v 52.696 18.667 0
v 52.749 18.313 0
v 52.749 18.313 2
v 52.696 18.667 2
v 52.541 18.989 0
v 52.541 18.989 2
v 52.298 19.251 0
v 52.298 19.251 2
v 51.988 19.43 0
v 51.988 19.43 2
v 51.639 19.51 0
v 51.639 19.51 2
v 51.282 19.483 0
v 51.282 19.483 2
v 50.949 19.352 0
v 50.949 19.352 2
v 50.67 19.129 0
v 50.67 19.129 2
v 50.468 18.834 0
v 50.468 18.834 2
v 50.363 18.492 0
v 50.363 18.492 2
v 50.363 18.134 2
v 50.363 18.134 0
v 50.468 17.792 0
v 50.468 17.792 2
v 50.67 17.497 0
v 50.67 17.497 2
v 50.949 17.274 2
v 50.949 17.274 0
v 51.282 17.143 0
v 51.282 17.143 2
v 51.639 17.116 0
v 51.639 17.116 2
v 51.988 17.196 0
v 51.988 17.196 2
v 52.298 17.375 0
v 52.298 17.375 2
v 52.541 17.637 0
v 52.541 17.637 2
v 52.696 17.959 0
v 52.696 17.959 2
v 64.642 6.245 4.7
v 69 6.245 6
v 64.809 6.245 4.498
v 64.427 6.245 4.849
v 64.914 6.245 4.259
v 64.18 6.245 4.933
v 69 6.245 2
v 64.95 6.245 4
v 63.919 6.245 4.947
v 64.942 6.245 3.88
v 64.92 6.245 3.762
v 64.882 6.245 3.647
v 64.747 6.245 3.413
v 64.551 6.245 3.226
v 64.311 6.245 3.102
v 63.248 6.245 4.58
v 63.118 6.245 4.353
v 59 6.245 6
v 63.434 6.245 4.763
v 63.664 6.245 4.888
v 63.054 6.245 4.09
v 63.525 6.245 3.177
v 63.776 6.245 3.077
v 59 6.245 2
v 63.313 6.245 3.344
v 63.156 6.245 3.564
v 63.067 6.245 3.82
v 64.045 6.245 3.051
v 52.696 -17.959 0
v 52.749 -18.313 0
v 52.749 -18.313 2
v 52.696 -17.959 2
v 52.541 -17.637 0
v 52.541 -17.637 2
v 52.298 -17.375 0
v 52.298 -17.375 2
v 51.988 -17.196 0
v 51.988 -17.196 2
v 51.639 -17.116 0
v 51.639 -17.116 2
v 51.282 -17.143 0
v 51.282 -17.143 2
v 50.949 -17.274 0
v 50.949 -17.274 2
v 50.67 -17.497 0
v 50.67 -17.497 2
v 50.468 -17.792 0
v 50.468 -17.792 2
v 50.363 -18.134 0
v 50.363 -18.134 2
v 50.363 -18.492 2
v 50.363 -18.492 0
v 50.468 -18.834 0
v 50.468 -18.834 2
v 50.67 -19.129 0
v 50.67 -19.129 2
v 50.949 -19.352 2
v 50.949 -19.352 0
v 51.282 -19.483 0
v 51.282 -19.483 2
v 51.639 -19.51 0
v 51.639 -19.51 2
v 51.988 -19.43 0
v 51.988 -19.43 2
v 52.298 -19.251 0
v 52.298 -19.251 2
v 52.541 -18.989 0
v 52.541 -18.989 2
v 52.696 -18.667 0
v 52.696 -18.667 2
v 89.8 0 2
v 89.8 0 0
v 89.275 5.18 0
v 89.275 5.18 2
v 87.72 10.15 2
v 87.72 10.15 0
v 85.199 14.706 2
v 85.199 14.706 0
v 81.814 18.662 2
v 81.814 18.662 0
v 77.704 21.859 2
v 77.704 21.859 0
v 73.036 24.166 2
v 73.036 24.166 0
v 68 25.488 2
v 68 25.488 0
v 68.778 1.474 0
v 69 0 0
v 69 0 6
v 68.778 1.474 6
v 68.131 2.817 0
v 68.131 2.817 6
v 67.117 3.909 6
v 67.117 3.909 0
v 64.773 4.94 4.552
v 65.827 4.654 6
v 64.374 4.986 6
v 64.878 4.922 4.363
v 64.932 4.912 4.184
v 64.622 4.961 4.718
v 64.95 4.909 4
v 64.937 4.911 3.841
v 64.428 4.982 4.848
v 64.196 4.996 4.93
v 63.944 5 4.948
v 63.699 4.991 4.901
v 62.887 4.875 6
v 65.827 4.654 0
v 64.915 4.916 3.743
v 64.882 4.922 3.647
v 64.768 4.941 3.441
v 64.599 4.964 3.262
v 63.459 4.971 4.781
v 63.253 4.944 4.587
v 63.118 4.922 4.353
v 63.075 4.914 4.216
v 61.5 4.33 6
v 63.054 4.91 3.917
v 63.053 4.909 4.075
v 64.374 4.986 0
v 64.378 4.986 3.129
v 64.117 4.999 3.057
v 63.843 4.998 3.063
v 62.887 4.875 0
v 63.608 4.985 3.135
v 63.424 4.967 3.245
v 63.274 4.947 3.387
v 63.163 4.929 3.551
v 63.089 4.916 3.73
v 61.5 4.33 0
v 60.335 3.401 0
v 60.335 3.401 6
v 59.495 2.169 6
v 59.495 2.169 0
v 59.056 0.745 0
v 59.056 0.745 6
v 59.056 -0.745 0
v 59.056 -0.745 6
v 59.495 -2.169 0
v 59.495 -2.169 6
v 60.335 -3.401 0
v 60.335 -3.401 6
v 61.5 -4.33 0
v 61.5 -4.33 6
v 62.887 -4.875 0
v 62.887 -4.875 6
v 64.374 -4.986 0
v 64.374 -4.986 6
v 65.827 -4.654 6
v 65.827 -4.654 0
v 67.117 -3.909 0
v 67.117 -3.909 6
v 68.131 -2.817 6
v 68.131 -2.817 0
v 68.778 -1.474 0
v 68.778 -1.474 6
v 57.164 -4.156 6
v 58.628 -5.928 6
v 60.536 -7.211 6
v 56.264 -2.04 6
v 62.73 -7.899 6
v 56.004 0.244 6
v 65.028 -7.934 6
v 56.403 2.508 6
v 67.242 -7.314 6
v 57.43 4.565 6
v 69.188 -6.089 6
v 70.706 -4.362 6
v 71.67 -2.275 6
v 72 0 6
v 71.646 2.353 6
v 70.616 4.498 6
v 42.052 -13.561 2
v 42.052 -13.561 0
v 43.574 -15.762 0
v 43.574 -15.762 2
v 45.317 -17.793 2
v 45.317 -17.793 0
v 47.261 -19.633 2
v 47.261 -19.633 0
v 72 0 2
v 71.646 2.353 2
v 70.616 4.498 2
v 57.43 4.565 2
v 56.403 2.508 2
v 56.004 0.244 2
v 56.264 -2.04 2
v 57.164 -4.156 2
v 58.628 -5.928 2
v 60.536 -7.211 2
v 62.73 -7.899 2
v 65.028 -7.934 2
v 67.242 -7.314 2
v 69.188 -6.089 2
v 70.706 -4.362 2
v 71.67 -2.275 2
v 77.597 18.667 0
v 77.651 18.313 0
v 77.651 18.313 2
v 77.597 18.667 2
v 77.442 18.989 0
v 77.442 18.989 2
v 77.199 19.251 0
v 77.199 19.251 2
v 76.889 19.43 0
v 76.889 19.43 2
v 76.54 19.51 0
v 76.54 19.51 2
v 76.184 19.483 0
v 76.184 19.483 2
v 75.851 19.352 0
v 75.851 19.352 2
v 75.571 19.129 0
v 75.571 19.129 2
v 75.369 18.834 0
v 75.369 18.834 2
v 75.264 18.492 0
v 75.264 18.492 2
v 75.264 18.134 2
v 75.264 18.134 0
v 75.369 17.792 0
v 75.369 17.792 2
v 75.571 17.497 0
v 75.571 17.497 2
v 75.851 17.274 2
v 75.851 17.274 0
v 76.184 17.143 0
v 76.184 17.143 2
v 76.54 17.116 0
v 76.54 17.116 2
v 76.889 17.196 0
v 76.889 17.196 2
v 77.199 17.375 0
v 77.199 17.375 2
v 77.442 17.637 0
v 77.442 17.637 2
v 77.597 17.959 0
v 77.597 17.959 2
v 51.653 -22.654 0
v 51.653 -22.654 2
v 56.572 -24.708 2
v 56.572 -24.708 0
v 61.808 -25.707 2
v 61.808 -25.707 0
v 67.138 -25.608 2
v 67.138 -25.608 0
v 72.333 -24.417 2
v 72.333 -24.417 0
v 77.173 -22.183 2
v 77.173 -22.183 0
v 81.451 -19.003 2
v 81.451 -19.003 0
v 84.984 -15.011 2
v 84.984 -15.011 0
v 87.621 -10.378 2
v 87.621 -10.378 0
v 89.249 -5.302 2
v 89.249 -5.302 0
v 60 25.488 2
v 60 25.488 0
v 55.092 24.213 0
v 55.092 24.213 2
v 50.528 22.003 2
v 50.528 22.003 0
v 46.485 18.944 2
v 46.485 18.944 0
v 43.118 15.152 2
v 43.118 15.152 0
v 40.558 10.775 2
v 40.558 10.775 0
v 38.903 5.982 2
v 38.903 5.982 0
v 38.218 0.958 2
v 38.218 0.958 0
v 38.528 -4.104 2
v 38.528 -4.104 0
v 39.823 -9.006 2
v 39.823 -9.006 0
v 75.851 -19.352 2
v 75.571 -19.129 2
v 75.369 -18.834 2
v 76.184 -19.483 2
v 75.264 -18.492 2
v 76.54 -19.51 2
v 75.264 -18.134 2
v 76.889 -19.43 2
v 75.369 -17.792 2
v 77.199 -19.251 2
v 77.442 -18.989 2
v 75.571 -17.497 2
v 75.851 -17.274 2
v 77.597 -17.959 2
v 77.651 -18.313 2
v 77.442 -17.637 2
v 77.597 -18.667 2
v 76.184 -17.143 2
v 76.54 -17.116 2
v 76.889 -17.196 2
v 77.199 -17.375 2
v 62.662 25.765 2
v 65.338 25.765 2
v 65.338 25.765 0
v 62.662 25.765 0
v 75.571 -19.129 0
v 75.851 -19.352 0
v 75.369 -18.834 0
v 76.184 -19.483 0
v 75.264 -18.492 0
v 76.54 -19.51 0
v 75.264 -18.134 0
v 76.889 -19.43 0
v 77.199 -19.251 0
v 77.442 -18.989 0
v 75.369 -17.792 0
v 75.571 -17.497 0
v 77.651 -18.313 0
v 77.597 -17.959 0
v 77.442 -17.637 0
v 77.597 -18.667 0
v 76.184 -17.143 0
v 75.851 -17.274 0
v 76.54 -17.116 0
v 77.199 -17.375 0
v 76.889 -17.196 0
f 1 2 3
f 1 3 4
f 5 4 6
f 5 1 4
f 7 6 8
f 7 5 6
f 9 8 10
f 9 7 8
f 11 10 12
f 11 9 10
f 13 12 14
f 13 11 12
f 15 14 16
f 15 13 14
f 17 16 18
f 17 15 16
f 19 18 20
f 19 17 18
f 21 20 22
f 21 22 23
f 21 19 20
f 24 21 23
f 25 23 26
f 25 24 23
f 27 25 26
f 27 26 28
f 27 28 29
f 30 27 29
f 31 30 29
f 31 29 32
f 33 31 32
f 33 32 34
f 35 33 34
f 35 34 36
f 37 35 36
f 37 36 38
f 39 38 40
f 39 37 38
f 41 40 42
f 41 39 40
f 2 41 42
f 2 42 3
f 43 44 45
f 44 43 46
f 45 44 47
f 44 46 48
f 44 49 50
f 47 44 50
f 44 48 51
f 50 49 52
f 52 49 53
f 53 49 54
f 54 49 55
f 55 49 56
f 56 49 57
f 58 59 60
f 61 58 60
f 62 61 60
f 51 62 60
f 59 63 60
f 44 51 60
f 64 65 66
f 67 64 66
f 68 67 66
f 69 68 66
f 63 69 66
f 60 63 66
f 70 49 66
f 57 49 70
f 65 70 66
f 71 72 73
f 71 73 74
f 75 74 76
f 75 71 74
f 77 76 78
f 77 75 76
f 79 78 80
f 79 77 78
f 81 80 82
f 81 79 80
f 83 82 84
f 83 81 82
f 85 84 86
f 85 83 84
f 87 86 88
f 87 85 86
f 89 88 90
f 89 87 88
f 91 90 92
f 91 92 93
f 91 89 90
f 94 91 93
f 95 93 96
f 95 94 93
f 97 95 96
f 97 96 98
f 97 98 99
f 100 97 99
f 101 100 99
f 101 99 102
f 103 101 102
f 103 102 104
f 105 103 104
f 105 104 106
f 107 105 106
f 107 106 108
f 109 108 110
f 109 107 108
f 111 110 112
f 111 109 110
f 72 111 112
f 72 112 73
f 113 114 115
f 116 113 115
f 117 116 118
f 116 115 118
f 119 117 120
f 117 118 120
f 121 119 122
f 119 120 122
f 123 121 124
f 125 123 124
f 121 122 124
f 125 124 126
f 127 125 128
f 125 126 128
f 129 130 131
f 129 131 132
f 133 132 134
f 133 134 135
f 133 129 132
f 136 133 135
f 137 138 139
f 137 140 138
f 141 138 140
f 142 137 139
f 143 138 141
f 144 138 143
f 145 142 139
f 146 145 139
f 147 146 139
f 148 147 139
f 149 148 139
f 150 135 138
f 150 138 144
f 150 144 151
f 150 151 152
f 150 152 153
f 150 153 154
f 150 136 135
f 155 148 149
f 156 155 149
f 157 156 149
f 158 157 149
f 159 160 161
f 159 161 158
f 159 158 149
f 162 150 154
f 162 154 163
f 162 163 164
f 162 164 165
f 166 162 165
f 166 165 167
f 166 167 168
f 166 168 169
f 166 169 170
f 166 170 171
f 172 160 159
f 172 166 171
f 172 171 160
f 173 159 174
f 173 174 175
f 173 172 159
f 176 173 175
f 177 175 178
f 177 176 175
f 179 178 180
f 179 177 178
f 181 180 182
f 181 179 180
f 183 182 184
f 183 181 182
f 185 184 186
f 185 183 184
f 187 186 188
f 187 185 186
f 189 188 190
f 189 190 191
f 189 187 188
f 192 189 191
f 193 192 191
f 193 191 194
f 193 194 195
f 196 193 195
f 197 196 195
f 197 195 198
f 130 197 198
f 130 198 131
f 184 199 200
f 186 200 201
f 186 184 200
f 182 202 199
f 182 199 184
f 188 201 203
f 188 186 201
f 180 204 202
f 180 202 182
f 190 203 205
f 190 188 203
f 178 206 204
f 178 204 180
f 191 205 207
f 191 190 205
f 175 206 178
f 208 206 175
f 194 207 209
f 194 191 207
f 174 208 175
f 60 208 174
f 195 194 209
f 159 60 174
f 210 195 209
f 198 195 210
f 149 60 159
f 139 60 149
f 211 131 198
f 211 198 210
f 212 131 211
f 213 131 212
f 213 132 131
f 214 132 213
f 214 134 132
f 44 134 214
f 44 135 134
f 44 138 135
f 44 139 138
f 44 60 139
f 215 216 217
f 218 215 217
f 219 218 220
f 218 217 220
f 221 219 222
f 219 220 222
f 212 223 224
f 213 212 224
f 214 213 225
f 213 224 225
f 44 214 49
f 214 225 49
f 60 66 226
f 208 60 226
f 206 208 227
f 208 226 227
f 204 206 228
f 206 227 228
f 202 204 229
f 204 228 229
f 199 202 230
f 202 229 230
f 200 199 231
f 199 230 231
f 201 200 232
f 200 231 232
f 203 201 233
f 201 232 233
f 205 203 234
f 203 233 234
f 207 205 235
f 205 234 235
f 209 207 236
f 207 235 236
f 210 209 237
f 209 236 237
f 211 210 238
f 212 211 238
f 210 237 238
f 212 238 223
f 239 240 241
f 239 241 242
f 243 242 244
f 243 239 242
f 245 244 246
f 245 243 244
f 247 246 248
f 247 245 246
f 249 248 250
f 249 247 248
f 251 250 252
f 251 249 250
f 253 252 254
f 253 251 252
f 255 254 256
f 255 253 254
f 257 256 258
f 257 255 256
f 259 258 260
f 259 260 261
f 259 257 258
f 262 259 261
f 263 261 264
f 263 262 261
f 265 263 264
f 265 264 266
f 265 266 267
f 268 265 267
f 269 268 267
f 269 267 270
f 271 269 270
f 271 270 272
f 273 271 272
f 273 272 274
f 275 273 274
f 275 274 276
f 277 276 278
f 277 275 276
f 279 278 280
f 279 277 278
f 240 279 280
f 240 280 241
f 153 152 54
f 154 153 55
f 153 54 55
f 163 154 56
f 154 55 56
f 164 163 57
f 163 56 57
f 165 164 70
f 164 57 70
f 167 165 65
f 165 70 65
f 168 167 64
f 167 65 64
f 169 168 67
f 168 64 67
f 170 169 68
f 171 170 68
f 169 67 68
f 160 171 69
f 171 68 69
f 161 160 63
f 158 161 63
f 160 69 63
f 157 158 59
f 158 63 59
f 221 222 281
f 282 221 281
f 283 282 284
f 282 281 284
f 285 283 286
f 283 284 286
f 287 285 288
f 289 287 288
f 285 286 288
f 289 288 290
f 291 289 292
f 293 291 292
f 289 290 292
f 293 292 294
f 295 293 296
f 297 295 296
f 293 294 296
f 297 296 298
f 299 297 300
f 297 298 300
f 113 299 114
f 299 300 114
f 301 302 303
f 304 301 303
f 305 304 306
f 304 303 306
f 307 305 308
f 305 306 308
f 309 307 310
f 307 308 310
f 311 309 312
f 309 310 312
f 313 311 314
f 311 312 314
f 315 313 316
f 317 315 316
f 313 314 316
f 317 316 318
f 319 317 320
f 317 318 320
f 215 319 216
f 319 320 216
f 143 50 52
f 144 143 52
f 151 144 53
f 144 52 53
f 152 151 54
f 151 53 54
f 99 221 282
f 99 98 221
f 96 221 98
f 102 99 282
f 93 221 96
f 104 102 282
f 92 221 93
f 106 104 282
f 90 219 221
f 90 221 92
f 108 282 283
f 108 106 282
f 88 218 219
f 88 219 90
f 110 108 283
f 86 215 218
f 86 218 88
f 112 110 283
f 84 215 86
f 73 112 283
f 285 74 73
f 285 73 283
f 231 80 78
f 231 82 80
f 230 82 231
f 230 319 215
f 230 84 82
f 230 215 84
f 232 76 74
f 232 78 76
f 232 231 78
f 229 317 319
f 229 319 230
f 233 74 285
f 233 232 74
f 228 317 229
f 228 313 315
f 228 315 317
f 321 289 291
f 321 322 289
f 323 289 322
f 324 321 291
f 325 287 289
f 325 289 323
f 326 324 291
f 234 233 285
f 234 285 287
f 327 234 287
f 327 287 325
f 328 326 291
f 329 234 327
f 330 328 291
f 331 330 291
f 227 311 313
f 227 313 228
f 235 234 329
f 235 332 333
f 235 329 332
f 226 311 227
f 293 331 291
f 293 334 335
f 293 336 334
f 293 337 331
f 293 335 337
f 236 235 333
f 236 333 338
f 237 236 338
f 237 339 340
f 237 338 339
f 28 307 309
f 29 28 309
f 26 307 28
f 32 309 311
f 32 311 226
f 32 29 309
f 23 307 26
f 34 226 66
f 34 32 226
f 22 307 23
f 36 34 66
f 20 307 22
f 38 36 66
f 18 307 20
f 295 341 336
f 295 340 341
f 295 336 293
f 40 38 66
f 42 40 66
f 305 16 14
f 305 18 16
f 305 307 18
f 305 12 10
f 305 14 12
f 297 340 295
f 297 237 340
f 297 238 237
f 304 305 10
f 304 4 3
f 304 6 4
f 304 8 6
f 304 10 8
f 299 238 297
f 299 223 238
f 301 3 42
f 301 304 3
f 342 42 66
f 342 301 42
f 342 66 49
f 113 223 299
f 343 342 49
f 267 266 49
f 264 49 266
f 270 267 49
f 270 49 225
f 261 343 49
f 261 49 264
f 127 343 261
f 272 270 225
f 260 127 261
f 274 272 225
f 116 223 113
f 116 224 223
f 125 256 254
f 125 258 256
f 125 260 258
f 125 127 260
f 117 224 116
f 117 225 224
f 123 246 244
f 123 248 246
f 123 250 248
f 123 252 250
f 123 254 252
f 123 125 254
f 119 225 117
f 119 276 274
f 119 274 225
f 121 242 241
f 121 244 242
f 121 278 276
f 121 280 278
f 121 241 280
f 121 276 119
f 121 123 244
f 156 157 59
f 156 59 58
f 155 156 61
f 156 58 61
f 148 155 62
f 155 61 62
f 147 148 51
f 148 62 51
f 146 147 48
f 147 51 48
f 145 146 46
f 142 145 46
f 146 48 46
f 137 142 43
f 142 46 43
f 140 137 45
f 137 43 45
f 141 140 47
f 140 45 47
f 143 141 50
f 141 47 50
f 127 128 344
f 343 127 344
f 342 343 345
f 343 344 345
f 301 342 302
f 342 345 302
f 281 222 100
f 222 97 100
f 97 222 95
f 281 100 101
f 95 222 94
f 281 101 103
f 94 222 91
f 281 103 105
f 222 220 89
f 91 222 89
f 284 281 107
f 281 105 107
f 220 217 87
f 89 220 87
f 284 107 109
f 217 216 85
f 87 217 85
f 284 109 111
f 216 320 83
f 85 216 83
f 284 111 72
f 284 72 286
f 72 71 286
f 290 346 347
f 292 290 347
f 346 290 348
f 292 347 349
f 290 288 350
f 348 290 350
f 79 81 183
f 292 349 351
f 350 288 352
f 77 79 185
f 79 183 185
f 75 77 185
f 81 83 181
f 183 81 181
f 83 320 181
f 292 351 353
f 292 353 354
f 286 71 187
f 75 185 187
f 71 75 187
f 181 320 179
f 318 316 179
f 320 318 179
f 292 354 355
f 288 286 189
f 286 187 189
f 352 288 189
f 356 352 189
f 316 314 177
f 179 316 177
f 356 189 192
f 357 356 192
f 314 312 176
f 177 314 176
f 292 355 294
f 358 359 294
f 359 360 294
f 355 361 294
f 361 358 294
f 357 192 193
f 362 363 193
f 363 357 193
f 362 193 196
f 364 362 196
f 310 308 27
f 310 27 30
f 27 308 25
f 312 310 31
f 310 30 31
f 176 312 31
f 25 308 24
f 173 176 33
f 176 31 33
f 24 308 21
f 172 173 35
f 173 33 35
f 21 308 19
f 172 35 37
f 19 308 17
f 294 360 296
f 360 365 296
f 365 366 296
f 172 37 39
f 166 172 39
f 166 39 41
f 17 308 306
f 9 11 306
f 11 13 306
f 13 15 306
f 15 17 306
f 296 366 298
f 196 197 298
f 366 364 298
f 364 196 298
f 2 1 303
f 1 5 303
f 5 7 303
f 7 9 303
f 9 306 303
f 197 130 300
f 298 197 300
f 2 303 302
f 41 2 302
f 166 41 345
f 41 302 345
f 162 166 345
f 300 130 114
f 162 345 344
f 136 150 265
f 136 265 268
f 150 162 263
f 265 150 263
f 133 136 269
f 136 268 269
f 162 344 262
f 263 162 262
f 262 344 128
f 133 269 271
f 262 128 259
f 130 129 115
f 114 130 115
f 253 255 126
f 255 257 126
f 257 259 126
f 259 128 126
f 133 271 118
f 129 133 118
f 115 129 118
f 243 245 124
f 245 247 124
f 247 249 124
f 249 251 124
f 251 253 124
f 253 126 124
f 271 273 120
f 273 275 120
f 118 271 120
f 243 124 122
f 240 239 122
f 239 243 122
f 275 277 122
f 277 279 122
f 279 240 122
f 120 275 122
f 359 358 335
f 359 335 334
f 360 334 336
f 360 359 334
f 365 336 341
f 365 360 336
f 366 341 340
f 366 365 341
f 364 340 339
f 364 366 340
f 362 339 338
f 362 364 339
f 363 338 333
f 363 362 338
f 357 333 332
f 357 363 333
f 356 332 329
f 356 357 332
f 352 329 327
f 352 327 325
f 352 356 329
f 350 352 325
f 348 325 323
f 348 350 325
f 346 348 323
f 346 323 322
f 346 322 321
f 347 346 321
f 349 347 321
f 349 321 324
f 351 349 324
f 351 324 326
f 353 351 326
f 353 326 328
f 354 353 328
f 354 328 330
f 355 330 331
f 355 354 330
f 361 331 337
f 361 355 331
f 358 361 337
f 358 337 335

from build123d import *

# Parameters (mm, degrees)
SKETCH_1_R          = 5
SKETCH_1_R_2        = 1.2
EXTRUDE_1_DEPTH     = 2
SKETCH_2_R          = 5
EXTRUDE_2_DEPTH     = 4
CUT_EXTRUDE_1_DEPTH = 4


with BuildPart() as part:
    # 草图1 → 凸台-拉伸1 (new body)
    # profile 1 of 9: a face of its own
    with BuildSketch(Plane.XY):
        with BuildLine():
            Line((50.787618615, 13.919461135), (48.798857294, 18.312980654))
            ThreePointArc((48.798857294, 18.312980654), (40.538542245, 4), (43.589554969, -12.241475957))
            ThreePointArc((43.589554969, -12.241475957), (45.937273528, -15.497674419), (48.798857294, -18.312980654))
            Line((48.798857294, -18.312980654), (53.988393324, -6.848393324))
            Line((53.988393324, -6.848393324), (54.3, -7.16))
            Line((54.3, -7.16), (54.3, -21.733614518))
            ThreePointArc((54.3, -21.733614518), (64, -23.8), (73.7, -21.733614518))
            Line((73.7, -21.733614518), (73.7, -6.915634891))
            Line((73.7, -6.915634891), (74.1123773, -7.071013151))
            Line((74.1123773, -7.071013151), (79.201142706, -18.312980654))
            ThreePointArc((79.201142706, -18.312980654), (85.543295899, -10.115651328), (87.8, 0))
            ThreePointArc((87.8, 0), (85.543295899, 10.115651328), (79.201142706, 18.312980654))
            Line((79.201142706, 18.312980654), (76.899825635, 13.228971143))
            Line((76.899825635, 13.228971143), (73.7, 14.677397496))
            Line((73.7, 14.677397496), (73.7, 21.733614518))
            ThreePointArc((73.7, 21.733614518), (70.904263941, 22.776548014), (68, 23.461457755))
            ThreePointArc((68, 23.461457755), (64, 23.8), (60, 23.461457755))
            ThreePointArc((60, 23.461457755), (57.095736059, 22.776548014), (54.3, 21.733614518))
            Line((54.3, 21.733614518), (54.3, 13.919461135))
            Line((54.3, 13.919461135), (50.787618615, 13.919461135))
        make_face()
        with Locations((64, 0)):
            Circle(SKETCH_1_R, mode=Mode.SUBTRACT)
    # profile 2 of 9: a face of its own
    with BuildSketch(Plane.XY):
        with BuildLine():
            ThreePointArc((43.589554969, -12.241475957), (40.538542245, 4), (48.798857294, 18.312980654))
            ThreePointArc((48.798857294, 18.312980654), (51.432505778, 20.211335655), (54.3, 21.733614518))
            ThreePointArc((54.3, 21.733614518), (57.095736059, 22.776548014), (60, 23.461457755))
            Line((60, 23.461457755), (60, 25.488036409))
            ThreePointArc((60, 25.488036409), (40.557730485, 10.774970998), (42.051507242, -13.561108569))
            Line((42.051507242, -13.561108569), (43.589554969, -12.241475957))
        make_face()
    # profile 3 of 9: a face of its own
    with BuildSketch(Plane.XY):
        with BuildLine():
            ThreePointArc((54.3, -21.733614518), (51.432505778, -20.211335655), (48.798857294, -18.312980654))
            Line((48.798857294, -18.312980654), (47.260809567, -19.632613266))
            ThreePointArc((47.260809567, -19.632613266), (74.811310902, -23.425532152), (89.8, 0))
            ThreePointArc((89.8, 0), (83.606631531, 16.76961538), (68, 25.488036409))
            Line((68, 25.488036409), (68, 23.461457755))
            ThreePointArc((68, 23.461457755), (70.904263941, 22.776548014), (73.7, 21.733614518))
            ThreePointArc((73.7, 21.733614518), (76.567494222, 20.211335655), (79.201142706, 18.312980654))
            ThreePointArc((79.201142706, 18.312980654), (85.543295899, 10.115651328), (87.8, 0))
            ThreePointArc((87.8, 0), (85.543295899, -10.115651328), (79.201142706, -18.312980654))
            ThreePointArc((79.201142706, -18.312980654), (76.567494222, -20.211335655), (73.7, -21.733614518))
            ThreePointArc((73.7, -21.733614518), (64, -23.8), (54.3, -21.733614518))
        make_face()
    # profile 4 of 9: a face of its own
    with BuildSketch(Plane.XY):
        with BuildLine():
            Line((60, 25.488036409), (60, 23.461457755))
            ThreePointArc((60, 23.461457755), (64, 23.8), (68, 23.461457755))
            Line((68, 23.461457755), (68, 25.488036409))
            ThreePointArc((68, 25.488036409), (64, 25.8), (60, 25.488036409))
        make_face()
    # profile 5 of 9: a face of its own
    with BuildSketch(Plane.XY):
        with BuildLine():
            ThreePointArc((48.798857294, -18.312980654), (45.937273528, -15.497674419), (43.589554969, -12.241475957))
            Line((43.589554969, -12.241475957), (42.051507242, -13.561108569))
            ThreePointArc((42.051507242, -13.561108569), (44.419397354, -16.8), (47.260809567, -19.632613266))
            Line((47.260809567, -19.632613266), (48.798857294, -18.312980654))
        make_face()
    # profile 6 of 9: a face of its own
    with BuildSketch(Plane.XY):
        with BuildLine():
            Line((53.988393324, -6.848393324), (48.798857294, -18.312980654))
            ThreePointArc((48.798857294, -18.312980654), (51.432505778, -20.211335655), (54.3, -21.733614518))
            Line((54.3, -21.733614518), (54.3, -7.16))
            Line((54.3, -7.16), (53.988393324, -6.848393324))
        make_face()
        with Locations((51.549428647, -18.312980654)):
            Circle(SKETCH_1_R_2, mode=Mode.SUBTRACT)
    # profile 7 of 9: a face of its own
    with BuildSketch(Plane.XY):
        with BuildLine():
            Line((73.7, -6.915634891), (73.7, -21.733614518))
            ThreePointArc((73.7, -21.733614518), (76.567494222, -20.211335655), (79.201142706, -18.312980654))
            Line((79.201142706, -18.312980654), (74.1123773, -7.071013151))
            Line((74.1123773, -7.071013151), (73.7, -6.915634891))
        make_face()
        with Locations((76.450571353, -18.312980654)):
            Circle(SKETCH_1_R_2, mode=Mode.SUBTRACT)
    # profile 8 of 9: a face of its own
    with BuildSketch(Plane.XY):
        with BuildLine():
            ThreePointArc((79.201142706, 18.312980654), (76.567494222, 20.211335655), (73.7, 21.733614518))
            Line((73.7, 21.733614518), (73.7, 14.677397496))
            Line((73.7, 14.677397496), (76.899825635, 13.228971143))
            Line((76.899825635, 13.228971143), (79.201142706, 18.312980654))
        make_face()
        with Locations((76.450571353, 18.312980654)):
            Circle(SKETCH_1_R_2, mode=Mode.SUBTRACT)
    # profile 9 of 9: a face of its own
    with BuildSketch(Plane.XY):
        with BuildLine():
            ThreePointArc((54.3, 21.733614518), (51.432505778, 20.211335655), (48.798857294, 18.312980654))
            Line((48.798857294, 18.312980654), (50.787618615, 13.919461135))
            Line((50.787618615, 13.919461135), (54.3, 13.919461135))
            Line((54.3, 13.919461135), (54.3, 21.733614518))
        make_face()
        with Locations((51.549428647, 18.312980654)):
            Circle(SKETCH_1_R_2, mode=Mode.SUBTRACT)
    extrude(amount=EXTRUDE_1_DEPTH)

    # 草图2 → 凸台-拉伸2 (add)
    with BuildSketch(Plane.XY.offset(2)):
        with BuildLine():
            ThreePointArc((72, 0), (71.211102551, 3.464101615), (69, 6.244997998))
            Line((69, 6.244997998), (59, 6.244997998))
            ThreePointArc((59, 6.244997998), (60.535898385, -7.211102551), (72, 0))
        make_face()
        with Locations((64, 0)):
            Circle(SKETCH_2_R, mode=Mode.SUBTRACT)
    extrude(amount=EXTRUDE_2_DEPTH)

    # 草图3 → 切除-拉伸1 (cut)
    with BuildSketch(Plane(origin=(0, 6.244997998, 0), x_dir=(1, 0, 0), z_dir=(0, 1, 0))):
        with BuildLine():
            ThreePointArc((64.95, -4), (64.932858567, -3.820347855), (64.882052856, -3.647178857))
            Line((64.882052856, -3.647178857), (63.117947144, -4.352821143))
            ThreePointArc((63.117947144, -4.352821143), (64.179652145, -4.932858567), (64.95, -4))
        make_face()
        with BuildLine():
            Line((63.117947144, -4.352821143), (64.882052856, -3.647178857))
            ThreePointArc((64.882052856, -3.647178857), (63.647178857, -3.117947144), (63.117947144, -4.352821143))
        make_face()
    extrude(amount=-CUT_EXTRUDE_1_DEPTH, mode=Mode.SUBTRACT)


solid = part.part
